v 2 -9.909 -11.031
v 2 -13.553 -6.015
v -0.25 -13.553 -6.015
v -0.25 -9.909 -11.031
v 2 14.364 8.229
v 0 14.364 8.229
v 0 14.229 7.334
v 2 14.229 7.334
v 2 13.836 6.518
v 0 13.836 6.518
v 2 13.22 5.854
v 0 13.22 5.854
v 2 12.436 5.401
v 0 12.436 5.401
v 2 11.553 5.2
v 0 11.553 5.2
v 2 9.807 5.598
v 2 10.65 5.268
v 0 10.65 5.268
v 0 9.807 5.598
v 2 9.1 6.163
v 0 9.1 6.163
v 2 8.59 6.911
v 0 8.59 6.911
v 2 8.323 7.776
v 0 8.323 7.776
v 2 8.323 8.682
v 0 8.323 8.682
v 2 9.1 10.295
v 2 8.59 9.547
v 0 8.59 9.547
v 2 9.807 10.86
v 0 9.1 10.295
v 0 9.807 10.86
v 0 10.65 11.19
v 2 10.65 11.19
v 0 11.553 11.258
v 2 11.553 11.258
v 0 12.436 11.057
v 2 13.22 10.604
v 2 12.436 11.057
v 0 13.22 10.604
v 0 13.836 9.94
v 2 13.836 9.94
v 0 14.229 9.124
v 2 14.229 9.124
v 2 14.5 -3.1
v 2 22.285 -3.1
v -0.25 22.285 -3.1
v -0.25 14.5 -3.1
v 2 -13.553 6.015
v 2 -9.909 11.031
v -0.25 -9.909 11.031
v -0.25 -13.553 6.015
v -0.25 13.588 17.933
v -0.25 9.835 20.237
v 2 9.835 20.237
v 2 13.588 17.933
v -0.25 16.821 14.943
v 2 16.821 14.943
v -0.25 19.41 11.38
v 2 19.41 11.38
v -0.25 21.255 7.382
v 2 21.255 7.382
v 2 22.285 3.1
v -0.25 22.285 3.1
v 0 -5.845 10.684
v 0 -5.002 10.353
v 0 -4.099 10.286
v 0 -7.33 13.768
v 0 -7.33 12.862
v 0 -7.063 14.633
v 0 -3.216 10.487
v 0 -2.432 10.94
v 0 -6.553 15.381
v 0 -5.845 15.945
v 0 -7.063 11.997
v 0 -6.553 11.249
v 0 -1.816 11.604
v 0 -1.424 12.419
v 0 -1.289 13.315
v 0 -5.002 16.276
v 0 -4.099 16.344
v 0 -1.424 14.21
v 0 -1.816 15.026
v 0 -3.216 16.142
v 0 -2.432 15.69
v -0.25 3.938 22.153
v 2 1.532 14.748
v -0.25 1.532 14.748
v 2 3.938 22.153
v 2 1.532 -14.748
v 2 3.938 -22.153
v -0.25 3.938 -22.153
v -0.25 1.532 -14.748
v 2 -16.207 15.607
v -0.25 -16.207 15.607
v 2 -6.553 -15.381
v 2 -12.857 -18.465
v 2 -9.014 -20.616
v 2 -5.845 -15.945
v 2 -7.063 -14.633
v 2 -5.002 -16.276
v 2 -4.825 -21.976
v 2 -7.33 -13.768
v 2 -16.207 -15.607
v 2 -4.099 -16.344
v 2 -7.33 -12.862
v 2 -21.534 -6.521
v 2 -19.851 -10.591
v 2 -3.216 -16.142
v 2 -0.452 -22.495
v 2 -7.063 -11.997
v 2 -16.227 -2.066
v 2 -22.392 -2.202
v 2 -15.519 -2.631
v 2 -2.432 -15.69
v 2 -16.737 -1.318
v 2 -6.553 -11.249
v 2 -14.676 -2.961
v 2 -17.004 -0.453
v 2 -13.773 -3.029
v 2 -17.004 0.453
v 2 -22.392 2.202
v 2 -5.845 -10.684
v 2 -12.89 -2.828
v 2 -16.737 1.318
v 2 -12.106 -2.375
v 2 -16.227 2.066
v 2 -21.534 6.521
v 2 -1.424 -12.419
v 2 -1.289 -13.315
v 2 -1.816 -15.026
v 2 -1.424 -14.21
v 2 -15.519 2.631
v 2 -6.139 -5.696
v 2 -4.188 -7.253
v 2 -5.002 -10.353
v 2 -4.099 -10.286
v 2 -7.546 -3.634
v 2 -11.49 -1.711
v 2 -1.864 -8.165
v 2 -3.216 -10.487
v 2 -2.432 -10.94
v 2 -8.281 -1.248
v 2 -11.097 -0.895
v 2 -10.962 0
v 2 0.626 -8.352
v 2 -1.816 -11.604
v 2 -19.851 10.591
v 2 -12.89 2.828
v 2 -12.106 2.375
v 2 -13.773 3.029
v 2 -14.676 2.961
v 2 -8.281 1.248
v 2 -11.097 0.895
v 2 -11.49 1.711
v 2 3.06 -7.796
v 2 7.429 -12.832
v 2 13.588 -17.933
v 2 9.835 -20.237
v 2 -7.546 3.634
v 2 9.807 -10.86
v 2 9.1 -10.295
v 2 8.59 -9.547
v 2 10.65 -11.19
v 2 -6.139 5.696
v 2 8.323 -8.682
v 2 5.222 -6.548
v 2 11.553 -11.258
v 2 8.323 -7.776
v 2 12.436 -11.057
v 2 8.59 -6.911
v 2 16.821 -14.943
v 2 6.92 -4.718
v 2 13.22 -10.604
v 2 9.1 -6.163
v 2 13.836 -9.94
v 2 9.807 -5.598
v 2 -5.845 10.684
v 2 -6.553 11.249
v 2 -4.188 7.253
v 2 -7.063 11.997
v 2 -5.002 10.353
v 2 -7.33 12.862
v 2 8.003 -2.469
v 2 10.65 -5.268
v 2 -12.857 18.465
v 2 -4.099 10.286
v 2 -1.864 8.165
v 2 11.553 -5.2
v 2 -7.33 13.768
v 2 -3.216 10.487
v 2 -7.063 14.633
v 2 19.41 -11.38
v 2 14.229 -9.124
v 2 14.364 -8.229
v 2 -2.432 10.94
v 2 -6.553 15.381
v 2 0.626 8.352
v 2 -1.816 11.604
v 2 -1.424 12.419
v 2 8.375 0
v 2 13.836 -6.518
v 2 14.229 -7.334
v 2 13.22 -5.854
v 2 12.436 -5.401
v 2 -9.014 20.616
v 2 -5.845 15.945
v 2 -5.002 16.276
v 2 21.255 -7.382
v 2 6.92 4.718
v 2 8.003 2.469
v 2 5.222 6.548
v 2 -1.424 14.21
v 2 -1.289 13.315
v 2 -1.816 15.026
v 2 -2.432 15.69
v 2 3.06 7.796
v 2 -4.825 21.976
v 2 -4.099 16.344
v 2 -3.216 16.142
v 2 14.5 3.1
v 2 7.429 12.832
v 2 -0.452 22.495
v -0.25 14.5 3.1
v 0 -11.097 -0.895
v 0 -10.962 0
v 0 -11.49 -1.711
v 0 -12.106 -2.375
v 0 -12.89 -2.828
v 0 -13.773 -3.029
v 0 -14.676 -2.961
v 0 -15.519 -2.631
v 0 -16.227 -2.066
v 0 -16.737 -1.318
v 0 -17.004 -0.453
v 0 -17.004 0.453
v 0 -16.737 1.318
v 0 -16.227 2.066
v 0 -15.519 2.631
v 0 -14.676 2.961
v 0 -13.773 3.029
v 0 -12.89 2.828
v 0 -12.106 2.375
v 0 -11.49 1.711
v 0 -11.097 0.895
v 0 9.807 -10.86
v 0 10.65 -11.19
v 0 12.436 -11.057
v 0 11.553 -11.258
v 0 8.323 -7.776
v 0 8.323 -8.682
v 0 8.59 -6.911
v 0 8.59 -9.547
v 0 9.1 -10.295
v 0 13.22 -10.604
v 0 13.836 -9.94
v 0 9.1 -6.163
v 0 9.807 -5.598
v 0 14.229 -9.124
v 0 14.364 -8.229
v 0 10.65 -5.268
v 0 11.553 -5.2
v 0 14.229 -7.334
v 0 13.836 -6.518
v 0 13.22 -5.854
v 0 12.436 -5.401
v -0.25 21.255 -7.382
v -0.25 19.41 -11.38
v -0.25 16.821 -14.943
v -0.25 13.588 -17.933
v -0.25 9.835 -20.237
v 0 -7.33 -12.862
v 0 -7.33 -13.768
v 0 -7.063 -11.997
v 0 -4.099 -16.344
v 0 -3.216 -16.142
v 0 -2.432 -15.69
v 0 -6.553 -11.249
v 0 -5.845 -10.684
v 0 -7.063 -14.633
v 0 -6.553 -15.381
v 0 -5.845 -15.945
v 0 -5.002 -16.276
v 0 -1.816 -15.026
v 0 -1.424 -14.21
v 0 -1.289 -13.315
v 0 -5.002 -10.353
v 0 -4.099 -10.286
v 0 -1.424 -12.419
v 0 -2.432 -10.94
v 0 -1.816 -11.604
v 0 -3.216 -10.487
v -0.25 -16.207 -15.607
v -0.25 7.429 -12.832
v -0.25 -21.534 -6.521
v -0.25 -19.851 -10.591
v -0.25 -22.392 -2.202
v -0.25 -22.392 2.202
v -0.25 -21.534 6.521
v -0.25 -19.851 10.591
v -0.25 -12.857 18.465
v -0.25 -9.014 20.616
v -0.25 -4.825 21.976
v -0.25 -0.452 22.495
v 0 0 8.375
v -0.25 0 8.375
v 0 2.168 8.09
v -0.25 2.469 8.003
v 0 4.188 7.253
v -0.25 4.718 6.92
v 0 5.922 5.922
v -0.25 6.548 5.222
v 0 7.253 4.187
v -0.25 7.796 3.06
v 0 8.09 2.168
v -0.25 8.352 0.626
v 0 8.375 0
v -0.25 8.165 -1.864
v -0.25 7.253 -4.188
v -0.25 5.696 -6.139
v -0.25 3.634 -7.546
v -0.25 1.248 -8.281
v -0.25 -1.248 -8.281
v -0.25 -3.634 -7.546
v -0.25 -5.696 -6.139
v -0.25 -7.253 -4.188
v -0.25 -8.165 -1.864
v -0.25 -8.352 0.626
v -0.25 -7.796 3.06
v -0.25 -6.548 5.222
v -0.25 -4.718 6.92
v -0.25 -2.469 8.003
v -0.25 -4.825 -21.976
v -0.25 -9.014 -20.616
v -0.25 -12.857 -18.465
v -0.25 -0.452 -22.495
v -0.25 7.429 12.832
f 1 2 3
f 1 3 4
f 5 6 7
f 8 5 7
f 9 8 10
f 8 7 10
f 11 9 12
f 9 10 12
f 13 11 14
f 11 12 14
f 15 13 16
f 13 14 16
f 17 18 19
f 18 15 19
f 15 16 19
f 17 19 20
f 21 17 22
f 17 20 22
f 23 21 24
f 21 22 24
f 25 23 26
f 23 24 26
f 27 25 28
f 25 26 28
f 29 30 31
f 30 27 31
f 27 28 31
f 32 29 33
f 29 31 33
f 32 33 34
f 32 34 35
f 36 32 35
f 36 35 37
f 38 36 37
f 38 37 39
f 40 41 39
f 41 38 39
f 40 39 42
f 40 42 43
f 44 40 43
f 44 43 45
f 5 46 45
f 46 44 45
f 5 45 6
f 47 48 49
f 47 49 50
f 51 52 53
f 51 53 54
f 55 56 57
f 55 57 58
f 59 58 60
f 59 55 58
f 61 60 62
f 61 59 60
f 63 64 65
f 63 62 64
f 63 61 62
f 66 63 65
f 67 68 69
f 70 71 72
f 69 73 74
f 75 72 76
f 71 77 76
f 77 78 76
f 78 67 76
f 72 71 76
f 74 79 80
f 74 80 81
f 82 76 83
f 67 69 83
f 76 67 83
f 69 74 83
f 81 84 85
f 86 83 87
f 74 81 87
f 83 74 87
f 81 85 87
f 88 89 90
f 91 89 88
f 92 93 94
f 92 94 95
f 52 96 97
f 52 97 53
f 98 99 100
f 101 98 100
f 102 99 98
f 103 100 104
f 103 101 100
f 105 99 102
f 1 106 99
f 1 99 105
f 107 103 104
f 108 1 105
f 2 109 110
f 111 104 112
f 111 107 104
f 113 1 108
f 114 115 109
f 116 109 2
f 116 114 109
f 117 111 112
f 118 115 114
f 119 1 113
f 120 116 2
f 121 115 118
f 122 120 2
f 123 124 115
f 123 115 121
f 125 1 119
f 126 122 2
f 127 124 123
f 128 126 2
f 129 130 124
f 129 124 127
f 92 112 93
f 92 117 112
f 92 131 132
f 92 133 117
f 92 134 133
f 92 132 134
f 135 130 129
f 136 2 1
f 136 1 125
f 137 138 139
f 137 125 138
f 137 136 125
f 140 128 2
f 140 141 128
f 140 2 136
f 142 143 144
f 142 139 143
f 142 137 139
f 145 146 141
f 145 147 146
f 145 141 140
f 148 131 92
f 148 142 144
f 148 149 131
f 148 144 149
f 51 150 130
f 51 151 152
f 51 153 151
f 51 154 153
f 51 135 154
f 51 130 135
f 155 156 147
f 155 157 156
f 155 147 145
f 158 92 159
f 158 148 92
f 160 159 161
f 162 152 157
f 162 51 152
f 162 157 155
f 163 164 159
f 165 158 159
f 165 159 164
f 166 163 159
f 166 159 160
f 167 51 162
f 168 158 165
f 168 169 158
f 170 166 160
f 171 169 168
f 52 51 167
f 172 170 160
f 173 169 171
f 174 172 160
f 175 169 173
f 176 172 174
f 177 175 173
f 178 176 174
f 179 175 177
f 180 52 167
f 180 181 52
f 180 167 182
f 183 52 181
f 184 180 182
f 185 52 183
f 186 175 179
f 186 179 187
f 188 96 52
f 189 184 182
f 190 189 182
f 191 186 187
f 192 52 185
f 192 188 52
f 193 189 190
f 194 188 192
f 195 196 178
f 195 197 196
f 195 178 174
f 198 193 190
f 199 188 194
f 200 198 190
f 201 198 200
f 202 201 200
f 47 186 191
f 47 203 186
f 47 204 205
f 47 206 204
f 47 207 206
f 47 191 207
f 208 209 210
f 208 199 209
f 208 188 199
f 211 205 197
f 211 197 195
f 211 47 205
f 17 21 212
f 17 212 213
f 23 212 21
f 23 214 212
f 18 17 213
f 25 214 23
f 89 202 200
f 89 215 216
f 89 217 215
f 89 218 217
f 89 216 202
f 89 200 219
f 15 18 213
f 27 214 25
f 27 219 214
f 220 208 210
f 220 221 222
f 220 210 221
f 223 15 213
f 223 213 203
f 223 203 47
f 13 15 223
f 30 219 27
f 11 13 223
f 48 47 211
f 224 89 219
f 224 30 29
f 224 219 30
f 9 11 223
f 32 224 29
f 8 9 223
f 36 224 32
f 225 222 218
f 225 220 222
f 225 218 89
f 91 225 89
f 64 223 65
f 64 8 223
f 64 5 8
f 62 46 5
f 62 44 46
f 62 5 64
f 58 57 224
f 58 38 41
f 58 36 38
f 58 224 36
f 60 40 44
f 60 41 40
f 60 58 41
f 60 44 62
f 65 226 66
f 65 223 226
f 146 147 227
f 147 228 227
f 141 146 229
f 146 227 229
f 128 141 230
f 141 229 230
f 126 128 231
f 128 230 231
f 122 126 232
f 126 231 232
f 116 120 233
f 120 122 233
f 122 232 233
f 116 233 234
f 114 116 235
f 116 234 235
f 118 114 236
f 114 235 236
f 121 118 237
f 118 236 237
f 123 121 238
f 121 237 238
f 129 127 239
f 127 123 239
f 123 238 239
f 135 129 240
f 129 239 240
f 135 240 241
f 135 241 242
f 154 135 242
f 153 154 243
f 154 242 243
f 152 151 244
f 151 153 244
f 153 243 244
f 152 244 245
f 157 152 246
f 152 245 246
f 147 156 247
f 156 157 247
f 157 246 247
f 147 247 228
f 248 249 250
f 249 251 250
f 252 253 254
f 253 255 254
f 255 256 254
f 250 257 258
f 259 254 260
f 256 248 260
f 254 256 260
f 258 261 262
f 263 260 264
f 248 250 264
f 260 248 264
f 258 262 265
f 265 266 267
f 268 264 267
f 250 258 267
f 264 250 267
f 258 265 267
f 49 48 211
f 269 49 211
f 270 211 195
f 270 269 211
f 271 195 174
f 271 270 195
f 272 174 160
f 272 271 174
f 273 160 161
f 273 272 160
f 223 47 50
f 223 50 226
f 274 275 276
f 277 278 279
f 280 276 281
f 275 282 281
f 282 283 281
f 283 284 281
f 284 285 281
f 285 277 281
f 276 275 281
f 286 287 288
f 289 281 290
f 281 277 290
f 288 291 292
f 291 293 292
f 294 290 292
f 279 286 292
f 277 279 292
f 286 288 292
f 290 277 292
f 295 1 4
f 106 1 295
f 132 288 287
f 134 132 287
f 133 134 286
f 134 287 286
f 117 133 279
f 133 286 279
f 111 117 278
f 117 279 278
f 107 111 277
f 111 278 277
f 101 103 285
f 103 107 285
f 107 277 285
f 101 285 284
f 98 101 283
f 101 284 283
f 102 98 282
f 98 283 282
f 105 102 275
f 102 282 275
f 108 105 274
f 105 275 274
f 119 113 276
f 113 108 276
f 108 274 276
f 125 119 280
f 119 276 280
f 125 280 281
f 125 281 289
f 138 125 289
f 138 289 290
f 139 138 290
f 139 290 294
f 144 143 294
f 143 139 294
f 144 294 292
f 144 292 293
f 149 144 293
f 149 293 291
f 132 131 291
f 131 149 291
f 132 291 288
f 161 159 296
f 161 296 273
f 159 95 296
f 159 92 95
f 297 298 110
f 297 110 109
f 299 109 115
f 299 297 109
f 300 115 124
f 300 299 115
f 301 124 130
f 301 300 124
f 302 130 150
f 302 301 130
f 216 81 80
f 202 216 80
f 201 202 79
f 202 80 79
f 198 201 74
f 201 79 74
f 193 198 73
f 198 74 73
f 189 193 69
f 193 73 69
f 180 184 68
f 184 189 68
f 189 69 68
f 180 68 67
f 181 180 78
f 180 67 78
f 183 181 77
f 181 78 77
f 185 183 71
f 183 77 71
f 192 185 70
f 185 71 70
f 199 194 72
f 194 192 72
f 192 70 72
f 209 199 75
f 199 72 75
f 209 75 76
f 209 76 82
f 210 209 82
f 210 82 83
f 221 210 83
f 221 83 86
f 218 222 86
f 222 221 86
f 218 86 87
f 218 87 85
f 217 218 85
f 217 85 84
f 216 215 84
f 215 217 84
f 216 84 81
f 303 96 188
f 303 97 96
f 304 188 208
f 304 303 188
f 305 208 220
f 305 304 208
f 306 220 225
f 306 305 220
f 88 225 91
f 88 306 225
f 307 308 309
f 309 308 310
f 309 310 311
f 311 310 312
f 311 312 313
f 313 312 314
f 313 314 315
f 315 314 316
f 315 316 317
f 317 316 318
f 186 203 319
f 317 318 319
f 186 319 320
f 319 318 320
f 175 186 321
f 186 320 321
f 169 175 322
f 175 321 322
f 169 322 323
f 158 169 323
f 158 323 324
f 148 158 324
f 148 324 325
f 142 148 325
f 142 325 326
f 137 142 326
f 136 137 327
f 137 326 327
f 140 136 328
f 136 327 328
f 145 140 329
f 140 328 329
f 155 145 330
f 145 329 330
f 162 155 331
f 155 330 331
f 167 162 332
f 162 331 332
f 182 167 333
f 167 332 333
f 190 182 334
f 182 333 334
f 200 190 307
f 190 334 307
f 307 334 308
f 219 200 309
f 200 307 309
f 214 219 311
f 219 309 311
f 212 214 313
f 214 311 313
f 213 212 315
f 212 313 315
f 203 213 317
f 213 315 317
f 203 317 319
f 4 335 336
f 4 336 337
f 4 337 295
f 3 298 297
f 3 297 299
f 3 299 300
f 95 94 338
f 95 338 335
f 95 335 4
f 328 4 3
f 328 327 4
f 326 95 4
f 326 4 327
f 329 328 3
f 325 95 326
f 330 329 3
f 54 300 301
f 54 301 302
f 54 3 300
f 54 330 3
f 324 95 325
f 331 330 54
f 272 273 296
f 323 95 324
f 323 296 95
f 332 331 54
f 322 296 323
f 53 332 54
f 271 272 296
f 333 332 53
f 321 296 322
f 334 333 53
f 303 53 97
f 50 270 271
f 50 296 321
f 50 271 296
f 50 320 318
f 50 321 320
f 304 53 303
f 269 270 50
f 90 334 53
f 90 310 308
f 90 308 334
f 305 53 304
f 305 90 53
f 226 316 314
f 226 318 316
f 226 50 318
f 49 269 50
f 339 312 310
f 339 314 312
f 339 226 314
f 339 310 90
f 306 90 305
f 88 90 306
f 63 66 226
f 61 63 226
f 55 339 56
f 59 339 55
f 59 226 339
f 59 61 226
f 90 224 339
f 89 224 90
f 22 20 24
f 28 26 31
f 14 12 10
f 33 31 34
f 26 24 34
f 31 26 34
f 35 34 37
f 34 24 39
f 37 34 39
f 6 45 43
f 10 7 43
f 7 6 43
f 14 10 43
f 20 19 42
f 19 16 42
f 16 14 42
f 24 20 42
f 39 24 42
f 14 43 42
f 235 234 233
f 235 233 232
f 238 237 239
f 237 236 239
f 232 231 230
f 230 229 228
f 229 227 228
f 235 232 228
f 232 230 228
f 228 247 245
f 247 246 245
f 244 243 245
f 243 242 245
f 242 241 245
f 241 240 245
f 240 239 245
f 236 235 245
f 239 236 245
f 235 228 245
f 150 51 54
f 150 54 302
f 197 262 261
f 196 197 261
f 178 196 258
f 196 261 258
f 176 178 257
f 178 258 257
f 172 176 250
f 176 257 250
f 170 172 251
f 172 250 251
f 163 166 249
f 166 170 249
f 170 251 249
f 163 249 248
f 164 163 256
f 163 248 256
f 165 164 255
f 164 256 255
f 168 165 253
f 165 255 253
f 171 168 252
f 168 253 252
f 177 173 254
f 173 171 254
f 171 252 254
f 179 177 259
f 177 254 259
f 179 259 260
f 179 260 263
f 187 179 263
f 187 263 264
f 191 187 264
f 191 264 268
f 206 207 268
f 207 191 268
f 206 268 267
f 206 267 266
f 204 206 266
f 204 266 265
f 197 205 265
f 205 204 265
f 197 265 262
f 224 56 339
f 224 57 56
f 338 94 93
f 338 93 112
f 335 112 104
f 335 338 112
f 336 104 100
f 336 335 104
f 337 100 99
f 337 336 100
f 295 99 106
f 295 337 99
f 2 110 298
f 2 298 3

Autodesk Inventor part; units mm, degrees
ref_plane "YZ Plane" through (0, 0, 0) normal (1, 0, 0) x (0, 1, 0)
ref_plane "XZ Plane" through (0, 0, 0) normal (0, 1, 0) x (-1, 0, 0)
ref_plane "XY Plane" through (0, 0, 0) normal (0, 0, 1) x (1, 0, 0)
sketch "Sketch1" plane through (0, 0, 0) normal (1, 0, 0) x (0, 1, 0)
  circle A0 centre (0, 0) radius 22.5
  circle A1 centre (0, 0) radius 8.375
  line L0 (8.375, 0) -> (22.5, 0) construction
  line L1 (22.1638, 3.875) -> (7.4246, 3.875) construction
  line L2 (7.4246, -3.875) -> (22.1638, -3.875) construction
  circle A2 centre (-14, 0) radius 3.0375
  circle A3 centre (-4.3262, -13.3148) radius 3.0375
  circle A4 centre (11.3262, -8.229) radius 3.0375
  circle A5 centre (11.3262, 8.229) radius 3.0375
  circle A6 centre (-4.3262, 13.3148) radius 3.0375
  dimension "d0" = 45
  dimension "d1" = 16.75
  dimension "d2" = 7.75
  dimension "d3" = 3.875
  dimension "d4" = 0
  dimension "d5" = 6.075
  dimension "d32" = 14
  dimension "d35" = 360
extrude "Extrusion1" add sketch "Sketch1" along normal blind 2
sketch "Sketch2" plane through (0, 0, 0) normal (-1, 0, 0) x (0, 0, 1)
  circle A0 centre (0, 0) radius 8.375 projected
  circle A1 centre (0, 0) radius 22.5 projected
extrude "Extrusion2" add sketch "Sketch2" along normal blind 0.25
sketch "Sketch3" plane through (2, 0, 0) normal (1, 0, 0) x (0, 0, -1)
  line L0 (-3.1, 26.8099) -> (3.1, 26.8099)
  line L1 (3.1, 26.8099) -> (3.1, 14.5)
  line L2 (3.1, 14.5) -> (-3.1, 14.5)
  line L3 (-3.1, 14.5) -> (-3.1, 26.8099)
  circle A0 centre (0, 0) radius 22.5 construction
  line L4 (-2.05, 26.8099) -> (2.05, 26.8099)
  line L5 (2.05, 26.8099) -> (2.05, 14.5)
  line L6 (2.05, 14.5) -> (-2.05, 14.5)
  line L7 (-2.05, 14.5) -> (-2.05, 26.8099)
  line L8 (-26.4557, 5.3365) -> (-24.5398, 11.233)
  line L9 (-24.5398, 11.233) -> (-12.8324, 7.429)
  line L10 (-12.8324, 7.429) -> (-14.7483, 1.5325)
  line L11 (-14.7483, 1.5325) -> (-26.4557, 5.3365)
  line L12 (-26.1313, 6.3351) -> (-24.8643, 10.2344)
  line L13 (-24.8643, 10.2344) -> (-13.1568, 6.4304)
  line L14 (-13.1568, 6.4304) -> (-14.4238, 2.5311)
  line L15 (-14.4238, 2.5311) -> (-26.1313, 6.3351)
  line L16 (-13.2505, -23.5118) -> (-18.2664, -19.8676)
  line L17 (-18.2664, -19.8676) -> (-11.0308, -9.9086)
  line L18 (-11.0308, -9.9086) -> (-6.0149, -13.5529)
  line L19 (-6.0149, -13.5529) -> (-13.2505, -23.5118)
  line L20 (-14.1, -22.8947) -> (-17.417, -20.4847)
  line L21 (-17.417, -20.4847) -> (-10.1814, -10.5258)
  line L22 (-10.1814, -10.5258) -> (-6.8644, -12.9357)
  line L23 (-6.8644, -12.9357) -> (-14.1, -22.8947)
  line L24 (18.2664, -19.8676) -> (13.2505, -23.5118)
  line L25 (13.2505, -23.5118) -> (6.0149, -13.5529)
  line L26 (6.0149, -13.5529) -> (11.0308, -9.9086)
  line L27 (11.0308, -9.9086) -> (18.2664, -19.8676)
  line L28 (17.417, -20.4847) -> (14.1, -22.8947)
  line L29 (14.1, -22.8947) -> (6.8644, -12.9357)
  line L30 (6.8644, -12.9357) -> (10.1814, -10.5258)
  line L31 (10.1814, -10.5258) -> (17.417, -20.4847)
  line L32 (24.5398, 11.233) -> (26.4557, 5.3365)
  line L33 (26.4557, 5.3365) -> (14.7483, 1.5325)
  line L34 (14.7483, 1.5325) -> (12.8324, 7.429)
  line L35 (12.8324, 7.429) -> (24.5398, 11.233)
  line L36 (24.8643, 10.2344) -> (26.1313, 6.3351)
  line L37 (26.1313, 6.3351) -> (14.4238, 2.5311)
  line L38 (14.4238, 2.5311) -> (13.1568, 6.4304)
  line L39 (13.1568, 6.4304) -> (24.8643, 10.2344)
  dimension "d15" = 6.2
  dimension "d16" = 3.1
  dimension "d17" = 8
  dimension "d22" = 0
  dimension "d23" = 0
  dimension "d24" = 1.05
  dimension "d25" = 1.05
  dimension "d28" = 360
extrude "Extrusion3" cut sketch "Sketch3" against normal up to surface (2.25 mm away)
equation "\"d3\" = 0.5 * d2"
equation "\"d16\" = 0.5 * d15"
equation "\"d25\" = d24"
properties part number "Magnetic Disk"
